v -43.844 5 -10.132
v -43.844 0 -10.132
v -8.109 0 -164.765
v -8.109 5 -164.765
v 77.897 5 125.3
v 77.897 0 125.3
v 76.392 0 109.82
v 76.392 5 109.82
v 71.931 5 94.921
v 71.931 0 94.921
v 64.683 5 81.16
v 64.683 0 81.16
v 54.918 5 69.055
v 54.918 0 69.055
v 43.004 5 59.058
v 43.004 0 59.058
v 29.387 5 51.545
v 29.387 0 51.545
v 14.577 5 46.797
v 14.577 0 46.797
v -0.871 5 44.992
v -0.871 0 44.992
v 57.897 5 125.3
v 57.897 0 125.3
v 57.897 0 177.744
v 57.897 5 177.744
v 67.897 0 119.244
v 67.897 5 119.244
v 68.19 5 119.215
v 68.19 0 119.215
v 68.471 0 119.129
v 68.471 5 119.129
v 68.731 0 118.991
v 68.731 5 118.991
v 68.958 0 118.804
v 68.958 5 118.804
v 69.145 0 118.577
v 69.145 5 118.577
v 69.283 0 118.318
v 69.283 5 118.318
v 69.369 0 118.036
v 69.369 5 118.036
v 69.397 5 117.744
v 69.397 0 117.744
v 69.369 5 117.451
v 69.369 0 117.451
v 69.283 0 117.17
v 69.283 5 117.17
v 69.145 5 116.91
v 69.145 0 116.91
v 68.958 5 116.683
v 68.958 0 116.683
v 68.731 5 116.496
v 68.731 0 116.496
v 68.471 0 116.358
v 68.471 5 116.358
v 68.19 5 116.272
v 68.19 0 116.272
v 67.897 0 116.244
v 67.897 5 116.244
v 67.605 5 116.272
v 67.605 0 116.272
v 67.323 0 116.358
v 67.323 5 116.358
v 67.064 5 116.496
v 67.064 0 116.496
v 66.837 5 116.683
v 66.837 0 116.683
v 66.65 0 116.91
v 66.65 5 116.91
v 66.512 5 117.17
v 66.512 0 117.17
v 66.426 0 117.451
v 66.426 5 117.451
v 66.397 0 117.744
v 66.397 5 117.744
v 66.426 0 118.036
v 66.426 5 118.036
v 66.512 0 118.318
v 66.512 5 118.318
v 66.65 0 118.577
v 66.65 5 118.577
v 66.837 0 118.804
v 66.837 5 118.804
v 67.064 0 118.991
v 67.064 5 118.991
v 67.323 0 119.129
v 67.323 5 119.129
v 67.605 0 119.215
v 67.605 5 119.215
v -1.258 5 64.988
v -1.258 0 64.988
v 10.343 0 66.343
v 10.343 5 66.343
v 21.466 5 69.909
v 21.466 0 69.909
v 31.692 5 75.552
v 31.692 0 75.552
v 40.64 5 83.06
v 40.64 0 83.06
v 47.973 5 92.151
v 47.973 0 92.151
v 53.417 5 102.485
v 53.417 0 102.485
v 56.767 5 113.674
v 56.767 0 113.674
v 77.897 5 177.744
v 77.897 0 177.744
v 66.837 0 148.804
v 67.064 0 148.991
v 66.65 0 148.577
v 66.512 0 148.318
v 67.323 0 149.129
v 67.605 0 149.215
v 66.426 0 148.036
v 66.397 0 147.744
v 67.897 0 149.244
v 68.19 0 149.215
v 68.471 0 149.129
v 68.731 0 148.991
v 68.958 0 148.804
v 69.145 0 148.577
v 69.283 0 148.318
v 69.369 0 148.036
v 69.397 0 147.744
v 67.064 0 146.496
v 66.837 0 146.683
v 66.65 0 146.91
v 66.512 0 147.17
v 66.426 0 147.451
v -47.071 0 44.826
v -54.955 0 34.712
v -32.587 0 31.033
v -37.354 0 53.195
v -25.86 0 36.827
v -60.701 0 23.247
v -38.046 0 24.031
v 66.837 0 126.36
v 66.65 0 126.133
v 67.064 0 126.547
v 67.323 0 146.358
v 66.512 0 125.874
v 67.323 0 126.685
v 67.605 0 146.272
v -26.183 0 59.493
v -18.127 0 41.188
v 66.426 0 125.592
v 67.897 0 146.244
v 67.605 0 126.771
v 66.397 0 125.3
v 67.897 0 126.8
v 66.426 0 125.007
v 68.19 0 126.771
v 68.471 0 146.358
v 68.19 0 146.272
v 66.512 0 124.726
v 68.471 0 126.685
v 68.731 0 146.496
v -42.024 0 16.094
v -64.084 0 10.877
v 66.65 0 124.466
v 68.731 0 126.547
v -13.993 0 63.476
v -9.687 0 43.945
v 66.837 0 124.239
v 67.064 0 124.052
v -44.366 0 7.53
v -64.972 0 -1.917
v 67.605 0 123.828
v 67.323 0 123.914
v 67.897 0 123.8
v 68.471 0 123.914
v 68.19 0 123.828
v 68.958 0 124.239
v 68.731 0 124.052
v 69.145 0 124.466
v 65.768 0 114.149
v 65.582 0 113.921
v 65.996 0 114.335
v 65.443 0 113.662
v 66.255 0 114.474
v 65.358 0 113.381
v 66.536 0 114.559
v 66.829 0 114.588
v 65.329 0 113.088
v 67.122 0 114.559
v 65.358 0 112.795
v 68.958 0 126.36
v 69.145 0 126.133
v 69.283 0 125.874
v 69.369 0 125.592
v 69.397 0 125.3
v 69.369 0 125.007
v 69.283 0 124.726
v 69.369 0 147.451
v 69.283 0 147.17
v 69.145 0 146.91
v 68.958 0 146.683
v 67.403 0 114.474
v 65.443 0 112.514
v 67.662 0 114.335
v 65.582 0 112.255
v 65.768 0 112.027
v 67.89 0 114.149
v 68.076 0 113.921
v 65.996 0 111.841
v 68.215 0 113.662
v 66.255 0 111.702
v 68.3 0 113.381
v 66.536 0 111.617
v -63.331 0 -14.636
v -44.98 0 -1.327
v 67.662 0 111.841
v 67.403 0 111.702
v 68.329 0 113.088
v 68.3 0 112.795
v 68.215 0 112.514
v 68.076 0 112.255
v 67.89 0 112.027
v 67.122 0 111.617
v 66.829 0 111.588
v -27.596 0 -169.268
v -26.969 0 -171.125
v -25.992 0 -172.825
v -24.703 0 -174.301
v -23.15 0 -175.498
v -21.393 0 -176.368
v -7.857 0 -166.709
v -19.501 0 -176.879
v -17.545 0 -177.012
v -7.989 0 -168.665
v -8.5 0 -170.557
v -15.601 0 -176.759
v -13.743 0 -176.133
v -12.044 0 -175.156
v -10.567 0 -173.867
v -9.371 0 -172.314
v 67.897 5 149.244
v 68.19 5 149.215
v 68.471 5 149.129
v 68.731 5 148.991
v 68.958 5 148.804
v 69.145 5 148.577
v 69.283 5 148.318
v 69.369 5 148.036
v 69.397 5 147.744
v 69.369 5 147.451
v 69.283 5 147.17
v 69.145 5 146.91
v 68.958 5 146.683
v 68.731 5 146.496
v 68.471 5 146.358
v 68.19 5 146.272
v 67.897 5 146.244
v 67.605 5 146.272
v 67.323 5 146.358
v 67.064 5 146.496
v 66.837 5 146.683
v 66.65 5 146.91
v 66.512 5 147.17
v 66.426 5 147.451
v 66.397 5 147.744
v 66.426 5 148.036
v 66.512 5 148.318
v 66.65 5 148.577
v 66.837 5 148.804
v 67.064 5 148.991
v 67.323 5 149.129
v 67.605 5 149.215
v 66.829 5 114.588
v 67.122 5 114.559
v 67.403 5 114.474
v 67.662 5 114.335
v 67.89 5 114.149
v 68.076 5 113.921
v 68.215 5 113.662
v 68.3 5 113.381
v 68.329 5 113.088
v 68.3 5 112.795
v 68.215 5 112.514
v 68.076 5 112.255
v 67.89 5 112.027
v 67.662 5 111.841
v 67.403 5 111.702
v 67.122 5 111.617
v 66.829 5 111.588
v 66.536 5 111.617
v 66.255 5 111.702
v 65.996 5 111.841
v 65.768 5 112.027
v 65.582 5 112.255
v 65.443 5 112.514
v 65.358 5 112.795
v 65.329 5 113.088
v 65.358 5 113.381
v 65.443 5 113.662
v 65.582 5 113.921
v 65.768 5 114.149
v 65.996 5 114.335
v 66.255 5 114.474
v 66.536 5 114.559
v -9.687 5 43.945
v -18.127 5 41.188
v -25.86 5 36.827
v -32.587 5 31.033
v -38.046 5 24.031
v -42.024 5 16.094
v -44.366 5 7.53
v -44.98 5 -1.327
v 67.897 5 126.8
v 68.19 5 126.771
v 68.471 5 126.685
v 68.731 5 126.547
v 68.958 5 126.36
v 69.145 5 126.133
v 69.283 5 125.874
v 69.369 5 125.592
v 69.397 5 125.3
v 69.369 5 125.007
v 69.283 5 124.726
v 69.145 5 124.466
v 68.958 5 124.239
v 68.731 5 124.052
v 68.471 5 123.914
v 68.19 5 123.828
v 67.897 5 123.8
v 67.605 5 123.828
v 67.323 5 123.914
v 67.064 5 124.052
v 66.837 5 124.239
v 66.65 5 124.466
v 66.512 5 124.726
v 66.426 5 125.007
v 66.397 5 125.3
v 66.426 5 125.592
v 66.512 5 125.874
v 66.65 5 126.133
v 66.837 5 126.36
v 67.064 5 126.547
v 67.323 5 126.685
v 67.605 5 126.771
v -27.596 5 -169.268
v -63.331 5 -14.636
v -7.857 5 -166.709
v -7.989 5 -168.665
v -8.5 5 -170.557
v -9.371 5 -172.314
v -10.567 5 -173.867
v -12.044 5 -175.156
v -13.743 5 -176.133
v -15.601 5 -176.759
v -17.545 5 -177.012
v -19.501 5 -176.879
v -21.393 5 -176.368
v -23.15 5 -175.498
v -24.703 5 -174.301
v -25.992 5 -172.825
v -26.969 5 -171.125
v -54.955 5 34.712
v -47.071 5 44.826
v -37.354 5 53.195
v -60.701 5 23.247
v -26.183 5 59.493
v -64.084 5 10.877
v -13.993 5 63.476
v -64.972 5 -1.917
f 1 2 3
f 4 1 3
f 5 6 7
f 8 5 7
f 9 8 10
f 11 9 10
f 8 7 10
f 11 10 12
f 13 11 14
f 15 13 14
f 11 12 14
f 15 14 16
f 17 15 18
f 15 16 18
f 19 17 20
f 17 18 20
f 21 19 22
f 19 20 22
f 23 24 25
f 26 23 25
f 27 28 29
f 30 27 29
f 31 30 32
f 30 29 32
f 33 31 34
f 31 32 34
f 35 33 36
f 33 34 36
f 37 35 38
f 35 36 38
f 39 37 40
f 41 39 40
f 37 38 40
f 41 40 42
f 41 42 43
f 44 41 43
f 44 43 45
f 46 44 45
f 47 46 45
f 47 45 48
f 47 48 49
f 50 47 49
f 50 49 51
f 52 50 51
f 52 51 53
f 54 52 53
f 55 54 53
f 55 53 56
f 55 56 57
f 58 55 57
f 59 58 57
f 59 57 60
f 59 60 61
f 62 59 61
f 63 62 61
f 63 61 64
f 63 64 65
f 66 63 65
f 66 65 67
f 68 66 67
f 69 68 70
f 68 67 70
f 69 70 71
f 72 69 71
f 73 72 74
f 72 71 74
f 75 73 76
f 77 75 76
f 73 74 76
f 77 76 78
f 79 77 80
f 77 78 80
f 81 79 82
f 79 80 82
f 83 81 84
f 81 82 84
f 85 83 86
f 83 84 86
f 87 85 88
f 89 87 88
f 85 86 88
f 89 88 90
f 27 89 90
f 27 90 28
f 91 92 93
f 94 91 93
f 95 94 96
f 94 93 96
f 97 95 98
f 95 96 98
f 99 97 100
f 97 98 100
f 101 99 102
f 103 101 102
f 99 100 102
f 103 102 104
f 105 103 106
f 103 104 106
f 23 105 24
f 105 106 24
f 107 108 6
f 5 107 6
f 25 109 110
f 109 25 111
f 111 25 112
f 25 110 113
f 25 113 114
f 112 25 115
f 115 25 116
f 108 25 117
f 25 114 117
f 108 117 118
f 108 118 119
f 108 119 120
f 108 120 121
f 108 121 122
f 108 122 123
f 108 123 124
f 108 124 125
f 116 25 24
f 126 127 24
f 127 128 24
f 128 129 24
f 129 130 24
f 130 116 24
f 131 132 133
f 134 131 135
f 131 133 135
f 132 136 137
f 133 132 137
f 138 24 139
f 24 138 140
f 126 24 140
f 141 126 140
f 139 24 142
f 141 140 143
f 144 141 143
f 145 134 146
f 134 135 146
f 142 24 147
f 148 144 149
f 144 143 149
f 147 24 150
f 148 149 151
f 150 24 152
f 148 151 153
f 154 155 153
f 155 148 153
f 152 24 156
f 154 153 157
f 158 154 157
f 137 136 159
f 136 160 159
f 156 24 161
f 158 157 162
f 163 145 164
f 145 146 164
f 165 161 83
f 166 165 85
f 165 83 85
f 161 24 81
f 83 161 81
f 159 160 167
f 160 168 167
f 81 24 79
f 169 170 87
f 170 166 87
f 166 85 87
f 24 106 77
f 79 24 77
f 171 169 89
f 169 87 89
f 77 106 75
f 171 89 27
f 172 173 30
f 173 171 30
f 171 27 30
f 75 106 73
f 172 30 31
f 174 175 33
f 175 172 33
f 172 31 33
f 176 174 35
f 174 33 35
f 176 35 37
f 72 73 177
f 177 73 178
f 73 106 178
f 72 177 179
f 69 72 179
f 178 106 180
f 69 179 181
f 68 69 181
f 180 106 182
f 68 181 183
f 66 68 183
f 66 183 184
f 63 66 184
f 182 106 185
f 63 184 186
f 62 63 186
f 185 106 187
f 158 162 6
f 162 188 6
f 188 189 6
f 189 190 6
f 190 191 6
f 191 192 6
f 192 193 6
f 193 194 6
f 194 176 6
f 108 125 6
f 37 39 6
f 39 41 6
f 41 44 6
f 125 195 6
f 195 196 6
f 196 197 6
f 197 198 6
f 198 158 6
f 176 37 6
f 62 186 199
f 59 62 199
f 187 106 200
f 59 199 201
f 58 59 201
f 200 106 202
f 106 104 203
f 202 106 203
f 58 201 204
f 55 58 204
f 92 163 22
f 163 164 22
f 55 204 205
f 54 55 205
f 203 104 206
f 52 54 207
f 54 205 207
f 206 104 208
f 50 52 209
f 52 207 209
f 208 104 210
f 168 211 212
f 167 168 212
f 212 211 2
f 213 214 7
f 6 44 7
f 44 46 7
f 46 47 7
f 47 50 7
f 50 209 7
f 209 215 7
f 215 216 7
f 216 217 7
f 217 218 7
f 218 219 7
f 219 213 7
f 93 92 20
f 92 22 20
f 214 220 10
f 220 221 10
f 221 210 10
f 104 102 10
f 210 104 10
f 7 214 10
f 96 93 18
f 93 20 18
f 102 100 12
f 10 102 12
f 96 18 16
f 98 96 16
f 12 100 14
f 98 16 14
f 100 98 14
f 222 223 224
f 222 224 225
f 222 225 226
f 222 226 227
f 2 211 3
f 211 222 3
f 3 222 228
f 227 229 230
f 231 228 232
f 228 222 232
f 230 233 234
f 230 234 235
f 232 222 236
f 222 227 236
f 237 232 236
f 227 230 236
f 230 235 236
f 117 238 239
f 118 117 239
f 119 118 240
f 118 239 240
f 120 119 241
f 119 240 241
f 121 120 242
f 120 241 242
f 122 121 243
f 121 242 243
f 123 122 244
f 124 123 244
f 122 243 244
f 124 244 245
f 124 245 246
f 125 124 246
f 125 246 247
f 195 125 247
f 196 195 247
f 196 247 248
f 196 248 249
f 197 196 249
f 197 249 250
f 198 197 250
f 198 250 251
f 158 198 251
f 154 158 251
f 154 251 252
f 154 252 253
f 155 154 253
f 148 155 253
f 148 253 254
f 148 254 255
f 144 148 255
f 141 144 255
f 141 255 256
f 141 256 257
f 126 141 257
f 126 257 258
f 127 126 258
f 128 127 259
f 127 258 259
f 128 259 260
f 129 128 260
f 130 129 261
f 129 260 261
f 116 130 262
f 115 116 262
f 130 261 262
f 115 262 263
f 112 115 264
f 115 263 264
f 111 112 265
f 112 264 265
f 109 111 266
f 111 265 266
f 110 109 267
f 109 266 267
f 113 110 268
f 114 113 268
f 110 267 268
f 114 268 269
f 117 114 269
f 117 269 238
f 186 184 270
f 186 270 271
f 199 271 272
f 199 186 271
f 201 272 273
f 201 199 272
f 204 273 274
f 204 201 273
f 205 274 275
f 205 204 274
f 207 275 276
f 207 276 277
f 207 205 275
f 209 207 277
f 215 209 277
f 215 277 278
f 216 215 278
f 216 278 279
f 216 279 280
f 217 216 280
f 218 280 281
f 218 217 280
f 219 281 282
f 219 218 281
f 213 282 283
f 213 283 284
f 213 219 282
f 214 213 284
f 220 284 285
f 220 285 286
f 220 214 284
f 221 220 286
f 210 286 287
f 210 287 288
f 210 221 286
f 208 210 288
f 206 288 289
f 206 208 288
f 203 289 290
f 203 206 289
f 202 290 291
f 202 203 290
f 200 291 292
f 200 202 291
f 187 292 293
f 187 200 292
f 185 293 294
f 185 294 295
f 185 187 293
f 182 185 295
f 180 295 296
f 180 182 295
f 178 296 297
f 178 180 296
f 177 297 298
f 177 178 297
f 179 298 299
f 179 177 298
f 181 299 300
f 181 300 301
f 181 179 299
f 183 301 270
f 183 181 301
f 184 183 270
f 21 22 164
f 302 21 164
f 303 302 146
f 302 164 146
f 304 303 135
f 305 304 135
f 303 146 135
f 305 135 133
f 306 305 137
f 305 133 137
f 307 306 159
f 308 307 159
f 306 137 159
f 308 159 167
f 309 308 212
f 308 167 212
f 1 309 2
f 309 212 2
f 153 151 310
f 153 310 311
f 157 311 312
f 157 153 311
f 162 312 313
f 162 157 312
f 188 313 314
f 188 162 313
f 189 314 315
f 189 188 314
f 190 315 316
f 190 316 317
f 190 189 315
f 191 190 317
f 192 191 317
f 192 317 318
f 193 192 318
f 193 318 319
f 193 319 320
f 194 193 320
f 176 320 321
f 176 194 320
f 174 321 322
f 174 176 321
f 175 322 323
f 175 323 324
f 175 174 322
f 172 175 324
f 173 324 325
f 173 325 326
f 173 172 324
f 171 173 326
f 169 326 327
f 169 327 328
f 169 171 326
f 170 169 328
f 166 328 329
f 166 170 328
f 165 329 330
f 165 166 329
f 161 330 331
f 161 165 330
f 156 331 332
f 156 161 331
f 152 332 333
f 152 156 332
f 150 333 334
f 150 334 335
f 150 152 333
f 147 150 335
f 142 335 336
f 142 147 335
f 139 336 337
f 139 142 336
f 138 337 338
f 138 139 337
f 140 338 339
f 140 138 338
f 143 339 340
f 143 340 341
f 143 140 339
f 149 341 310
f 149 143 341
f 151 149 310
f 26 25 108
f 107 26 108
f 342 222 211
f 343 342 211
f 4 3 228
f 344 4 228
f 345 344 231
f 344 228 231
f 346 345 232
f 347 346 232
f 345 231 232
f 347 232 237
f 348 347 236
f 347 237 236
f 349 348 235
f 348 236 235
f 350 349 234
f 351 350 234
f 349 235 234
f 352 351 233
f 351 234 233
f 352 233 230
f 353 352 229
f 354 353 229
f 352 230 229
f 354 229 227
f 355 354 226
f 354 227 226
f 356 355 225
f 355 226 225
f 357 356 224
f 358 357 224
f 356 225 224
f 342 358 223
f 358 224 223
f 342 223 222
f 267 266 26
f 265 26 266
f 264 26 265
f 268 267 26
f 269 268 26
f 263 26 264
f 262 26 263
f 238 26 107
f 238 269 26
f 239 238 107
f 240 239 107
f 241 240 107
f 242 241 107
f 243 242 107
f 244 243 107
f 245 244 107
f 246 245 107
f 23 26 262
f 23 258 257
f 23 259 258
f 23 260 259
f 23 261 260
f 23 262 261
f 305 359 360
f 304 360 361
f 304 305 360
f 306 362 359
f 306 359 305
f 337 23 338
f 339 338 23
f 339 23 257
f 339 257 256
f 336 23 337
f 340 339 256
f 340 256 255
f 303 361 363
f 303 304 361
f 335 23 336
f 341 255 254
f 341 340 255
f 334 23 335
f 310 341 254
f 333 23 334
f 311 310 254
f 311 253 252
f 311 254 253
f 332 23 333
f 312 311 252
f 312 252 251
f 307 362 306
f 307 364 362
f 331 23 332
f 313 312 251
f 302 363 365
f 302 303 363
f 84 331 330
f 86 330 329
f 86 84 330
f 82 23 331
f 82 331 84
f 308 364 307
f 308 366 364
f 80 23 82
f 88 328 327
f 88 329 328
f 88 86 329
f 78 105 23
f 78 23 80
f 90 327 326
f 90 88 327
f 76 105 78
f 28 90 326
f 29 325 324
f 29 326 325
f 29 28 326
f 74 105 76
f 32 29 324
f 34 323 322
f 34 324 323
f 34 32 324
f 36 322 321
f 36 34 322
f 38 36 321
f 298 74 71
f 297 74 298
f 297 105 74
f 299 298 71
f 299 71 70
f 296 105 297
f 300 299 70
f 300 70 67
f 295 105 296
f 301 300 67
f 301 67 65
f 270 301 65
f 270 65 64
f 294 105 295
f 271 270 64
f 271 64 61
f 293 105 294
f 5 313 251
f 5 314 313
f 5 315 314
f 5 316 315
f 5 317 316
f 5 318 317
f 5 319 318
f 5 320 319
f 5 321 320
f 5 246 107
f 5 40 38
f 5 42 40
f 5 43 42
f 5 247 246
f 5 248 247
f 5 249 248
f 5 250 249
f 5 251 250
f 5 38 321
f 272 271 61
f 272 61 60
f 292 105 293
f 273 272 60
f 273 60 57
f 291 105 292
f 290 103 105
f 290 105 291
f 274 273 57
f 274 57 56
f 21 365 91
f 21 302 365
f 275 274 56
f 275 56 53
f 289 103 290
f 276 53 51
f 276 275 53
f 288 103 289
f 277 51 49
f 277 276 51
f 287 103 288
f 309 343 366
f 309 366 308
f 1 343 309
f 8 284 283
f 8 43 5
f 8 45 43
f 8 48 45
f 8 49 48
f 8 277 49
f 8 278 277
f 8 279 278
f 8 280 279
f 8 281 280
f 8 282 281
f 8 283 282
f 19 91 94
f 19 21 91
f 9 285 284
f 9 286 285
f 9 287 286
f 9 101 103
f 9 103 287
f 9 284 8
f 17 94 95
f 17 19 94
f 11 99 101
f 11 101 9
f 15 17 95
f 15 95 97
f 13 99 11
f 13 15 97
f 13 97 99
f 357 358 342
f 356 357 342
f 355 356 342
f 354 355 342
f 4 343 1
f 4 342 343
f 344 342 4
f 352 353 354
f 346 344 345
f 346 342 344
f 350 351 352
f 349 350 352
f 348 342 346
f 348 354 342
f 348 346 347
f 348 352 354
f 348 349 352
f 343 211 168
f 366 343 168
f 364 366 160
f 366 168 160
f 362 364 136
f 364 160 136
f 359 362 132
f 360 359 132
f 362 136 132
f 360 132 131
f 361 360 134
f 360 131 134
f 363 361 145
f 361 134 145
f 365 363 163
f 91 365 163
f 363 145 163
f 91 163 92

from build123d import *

# Parameters (mm, degrees)
SKETCH_1_R          = 1.5
EXTRUDE_1_DEPTH     = 5
SKETCH_2_R          = 1.5
CUT_EXTRUDE_2_DEPTH = 195.128306699


with BuildPart() as part:
    # 草圖1 → 伸長1 (new body)
    with BuildSketch(Plane(origin=(0, 0, 0), x_dir=(1, 0, 0), z_dir=(0, 1, 0))):
        with BuildLine():
            Line((57.897360436, -125.299605011), (57.897360436, -177.743637577))
            Line((57.897360436, -177.743637577), (77.897360436, -177.743637577))
            Line((77.897360436, -177.743637577), (77.897360436, -125.299605011))
            ThreePointArc((77.897360436, -125.299605011), (54.918314005, -69.05496851), (-0.871008877, -44.991569694))
            ThreePointArc((-0.871008877, -44.991569694), (-35.489867026, -27.667116556), (-43.844435656, 10.132396657))
            Line((-43.844435656, 10.132396657), (-8.109110739, 164.764632944))
            ThreePointArc((-8.109110739, 164.764632944), (-15.600674961, 176.759484569), (-27.595526586, 169.267920347))
            Line((-27.595526586, 169.267920347), (-63.330851503, 14.63568406))
            ThreePointArc((-63.330851503, 14.63568406), (-51.263141259, -39.963612803), (-1.258123933, -64.987822891))
            ThreePointArc((-1.258123933, -64.987822891), (40.639968493, -83.059569519), (57.897360436, -125.299605011))
        make_face()
        with Locations(Location((66.82899479, -113.088129791, 0), (0, 0, 270))):
            Circle(SKETCH_1_R, mode=Mode.SUBTRACT)
        with Locations(Location((67.897360436, -125.299605011, 0), (0, 0, 270))):
            Circle(SKETCH_1_R, mode=Mode.SUBTRACT)
    extrude(amount=EXTRUDE_1_DEPTH)

    # 草圖2 → 伸長2 (cut, through all)
    with BuildSketch(Plane(origin=(0, 5, 0), x_dir=(1, 0, 0), z_dir=(0, 1, 0))):
        with Locations(Location((67.897360436, -117.743637577, 0), (0, 0, 270))):
            Circle(SKETCH_2_R)
        with Locations(Location((67.897360436, -147.743637577, 0), (0, 0, 270))):
            Circle(SKETCH_2_R)
    extrude(amount=-CUT_EXTRUDE_2_DEPTH, mode=Mode.SUBTRACT)


solid = part.part
